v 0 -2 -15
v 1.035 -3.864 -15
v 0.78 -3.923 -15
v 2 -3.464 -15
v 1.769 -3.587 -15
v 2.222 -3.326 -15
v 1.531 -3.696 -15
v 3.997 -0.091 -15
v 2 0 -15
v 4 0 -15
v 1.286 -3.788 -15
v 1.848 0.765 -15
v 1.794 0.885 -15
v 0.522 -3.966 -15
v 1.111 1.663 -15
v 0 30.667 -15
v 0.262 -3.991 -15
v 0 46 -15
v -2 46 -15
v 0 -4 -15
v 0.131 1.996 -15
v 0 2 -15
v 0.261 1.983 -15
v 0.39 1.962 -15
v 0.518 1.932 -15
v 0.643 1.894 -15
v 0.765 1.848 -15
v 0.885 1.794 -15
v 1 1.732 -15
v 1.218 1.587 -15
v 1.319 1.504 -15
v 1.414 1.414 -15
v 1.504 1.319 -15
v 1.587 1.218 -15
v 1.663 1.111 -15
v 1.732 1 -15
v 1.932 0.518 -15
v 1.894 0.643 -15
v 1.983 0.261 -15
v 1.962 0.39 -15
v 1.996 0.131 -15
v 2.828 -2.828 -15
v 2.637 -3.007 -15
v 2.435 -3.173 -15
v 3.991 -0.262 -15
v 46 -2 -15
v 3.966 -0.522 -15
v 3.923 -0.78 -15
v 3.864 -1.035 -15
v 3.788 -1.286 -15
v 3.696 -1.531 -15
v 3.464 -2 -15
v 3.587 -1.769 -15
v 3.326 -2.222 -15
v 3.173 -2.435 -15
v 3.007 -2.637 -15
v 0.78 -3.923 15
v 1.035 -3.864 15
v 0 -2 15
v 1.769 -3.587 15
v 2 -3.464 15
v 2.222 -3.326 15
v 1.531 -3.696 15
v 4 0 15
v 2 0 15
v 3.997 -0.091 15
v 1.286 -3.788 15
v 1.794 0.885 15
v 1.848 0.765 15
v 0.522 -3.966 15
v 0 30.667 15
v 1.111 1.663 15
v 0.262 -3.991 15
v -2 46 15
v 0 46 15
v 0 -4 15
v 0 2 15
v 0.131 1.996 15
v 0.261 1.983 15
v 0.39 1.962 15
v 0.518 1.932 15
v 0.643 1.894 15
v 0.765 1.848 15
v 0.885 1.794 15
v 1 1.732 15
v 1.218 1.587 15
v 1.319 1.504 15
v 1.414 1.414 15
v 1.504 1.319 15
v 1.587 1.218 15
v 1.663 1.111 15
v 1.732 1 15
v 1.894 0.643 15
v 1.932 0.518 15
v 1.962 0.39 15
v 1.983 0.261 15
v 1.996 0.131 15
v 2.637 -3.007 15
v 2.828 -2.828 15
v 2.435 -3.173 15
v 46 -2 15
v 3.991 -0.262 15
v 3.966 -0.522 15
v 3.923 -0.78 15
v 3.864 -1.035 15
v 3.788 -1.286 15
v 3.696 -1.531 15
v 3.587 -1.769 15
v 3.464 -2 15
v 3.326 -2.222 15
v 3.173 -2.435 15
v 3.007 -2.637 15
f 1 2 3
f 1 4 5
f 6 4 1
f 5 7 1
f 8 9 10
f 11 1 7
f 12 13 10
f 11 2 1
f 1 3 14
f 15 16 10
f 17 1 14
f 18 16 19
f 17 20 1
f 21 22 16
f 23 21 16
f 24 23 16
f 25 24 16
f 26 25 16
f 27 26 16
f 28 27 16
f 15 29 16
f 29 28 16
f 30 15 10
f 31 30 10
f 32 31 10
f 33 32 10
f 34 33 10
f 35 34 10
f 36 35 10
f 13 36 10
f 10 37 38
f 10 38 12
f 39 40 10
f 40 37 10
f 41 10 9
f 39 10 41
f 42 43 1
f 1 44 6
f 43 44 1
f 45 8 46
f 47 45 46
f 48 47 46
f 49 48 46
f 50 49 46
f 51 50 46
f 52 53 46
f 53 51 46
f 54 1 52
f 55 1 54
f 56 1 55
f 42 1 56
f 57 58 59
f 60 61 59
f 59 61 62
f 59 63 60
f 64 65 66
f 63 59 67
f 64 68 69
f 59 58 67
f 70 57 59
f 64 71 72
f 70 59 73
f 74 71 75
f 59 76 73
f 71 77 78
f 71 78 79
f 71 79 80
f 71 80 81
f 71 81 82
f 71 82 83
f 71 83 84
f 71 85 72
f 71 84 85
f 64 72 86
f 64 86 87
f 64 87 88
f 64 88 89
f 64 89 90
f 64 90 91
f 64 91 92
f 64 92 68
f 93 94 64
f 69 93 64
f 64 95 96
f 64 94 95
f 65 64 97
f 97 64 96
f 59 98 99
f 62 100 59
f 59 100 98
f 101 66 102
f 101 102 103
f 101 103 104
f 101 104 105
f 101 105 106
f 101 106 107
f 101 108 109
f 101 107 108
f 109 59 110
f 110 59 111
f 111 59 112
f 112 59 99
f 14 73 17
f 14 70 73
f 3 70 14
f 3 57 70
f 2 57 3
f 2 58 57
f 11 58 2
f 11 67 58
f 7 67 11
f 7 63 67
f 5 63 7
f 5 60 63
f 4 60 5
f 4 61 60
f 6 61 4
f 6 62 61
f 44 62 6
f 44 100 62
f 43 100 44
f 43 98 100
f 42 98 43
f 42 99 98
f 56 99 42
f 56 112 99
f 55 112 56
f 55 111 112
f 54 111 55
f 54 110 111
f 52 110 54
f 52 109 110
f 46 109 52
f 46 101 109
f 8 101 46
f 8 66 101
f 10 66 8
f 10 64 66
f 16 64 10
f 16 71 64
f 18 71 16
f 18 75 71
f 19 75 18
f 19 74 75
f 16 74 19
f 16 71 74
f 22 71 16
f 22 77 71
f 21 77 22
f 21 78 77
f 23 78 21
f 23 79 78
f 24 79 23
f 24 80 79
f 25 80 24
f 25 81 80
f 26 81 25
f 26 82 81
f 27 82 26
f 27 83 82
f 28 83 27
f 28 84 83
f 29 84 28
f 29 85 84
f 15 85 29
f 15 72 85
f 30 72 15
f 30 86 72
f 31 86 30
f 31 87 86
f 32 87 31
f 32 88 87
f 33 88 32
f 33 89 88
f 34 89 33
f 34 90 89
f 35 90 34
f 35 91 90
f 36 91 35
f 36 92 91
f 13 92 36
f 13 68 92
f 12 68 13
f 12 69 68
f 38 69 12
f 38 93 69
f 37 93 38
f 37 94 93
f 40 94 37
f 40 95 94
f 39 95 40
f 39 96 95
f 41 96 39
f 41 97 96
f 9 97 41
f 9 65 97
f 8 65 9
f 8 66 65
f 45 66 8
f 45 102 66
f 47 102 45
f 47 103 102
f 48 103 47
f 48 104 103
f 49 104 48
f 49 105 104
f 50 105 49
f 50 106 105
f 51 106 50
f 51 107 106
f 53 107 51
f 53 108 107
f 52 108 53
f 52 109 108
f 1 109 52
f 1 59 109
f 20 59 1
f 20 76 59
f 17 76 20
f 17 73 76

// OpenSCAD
// Units: mm
$fn = 96;

thickness_mm = 2.0;
bend_radius_mm = 2.0;
k_factor = 0.45;
bend_angle_deg = 90.0;

outside_flange_a_mm = 50.0;
outside_flange_b_mm = 50.0;
width_mm = 30.0;

outside_setback_mm = (bend_radius_mm + thickness_mm) * tan(bend_angle_deg / 2);
bend_allowance_mm = (PI / 180) * bend_angle_deg * (bend_radius_mm + k_factor * thickness_mm);
developed_flat_length_mm =
    outside_flange_a_mm + outside_flange_b_mm
    - 2 * outside_setback_mm
    + bend_allowance_mm;

echo(str(
    "MAKERBENCH-SHEETMETAL: {",
    "\"thickness_mm\":", thickness_mm, ",",
    "\"bend_radius_mm\":", bend_radius_mm, ",",
    "\"developed_flat_length_mm\":", developed_flat_length_mm,
    "}"
));

module formed_l_bracket() {
    r_i = bend_radius_mm;
    r_o = bend_radius_mm + thickness_mm;
    straight_a = outside_flange_a_mm - outside_setback_mm;
    straight_b = outside_flange_b_mm - outside_setback_mm;

    linear_extrude(height = width_mm, center = true, convexity = 10)
        polygon(points = concat(
            [[straight_a, -thickness_mm], [0, -thickness_mm]],
            [for (i = [0 : 24])
                let(a = -90 + i * 90 / 24)
                [r_o * cos(a), r_o * sin(a)]
            ],
            [[-thickness_mm, straight_b], [0, straight_b]],
            [for (i = [24 : -1 : 0])
                let(a = i * 90 / 24)
                [r_i * cos(a), r_i * sin(a)]
            ]
        ));
}

formed_l_bracket();
